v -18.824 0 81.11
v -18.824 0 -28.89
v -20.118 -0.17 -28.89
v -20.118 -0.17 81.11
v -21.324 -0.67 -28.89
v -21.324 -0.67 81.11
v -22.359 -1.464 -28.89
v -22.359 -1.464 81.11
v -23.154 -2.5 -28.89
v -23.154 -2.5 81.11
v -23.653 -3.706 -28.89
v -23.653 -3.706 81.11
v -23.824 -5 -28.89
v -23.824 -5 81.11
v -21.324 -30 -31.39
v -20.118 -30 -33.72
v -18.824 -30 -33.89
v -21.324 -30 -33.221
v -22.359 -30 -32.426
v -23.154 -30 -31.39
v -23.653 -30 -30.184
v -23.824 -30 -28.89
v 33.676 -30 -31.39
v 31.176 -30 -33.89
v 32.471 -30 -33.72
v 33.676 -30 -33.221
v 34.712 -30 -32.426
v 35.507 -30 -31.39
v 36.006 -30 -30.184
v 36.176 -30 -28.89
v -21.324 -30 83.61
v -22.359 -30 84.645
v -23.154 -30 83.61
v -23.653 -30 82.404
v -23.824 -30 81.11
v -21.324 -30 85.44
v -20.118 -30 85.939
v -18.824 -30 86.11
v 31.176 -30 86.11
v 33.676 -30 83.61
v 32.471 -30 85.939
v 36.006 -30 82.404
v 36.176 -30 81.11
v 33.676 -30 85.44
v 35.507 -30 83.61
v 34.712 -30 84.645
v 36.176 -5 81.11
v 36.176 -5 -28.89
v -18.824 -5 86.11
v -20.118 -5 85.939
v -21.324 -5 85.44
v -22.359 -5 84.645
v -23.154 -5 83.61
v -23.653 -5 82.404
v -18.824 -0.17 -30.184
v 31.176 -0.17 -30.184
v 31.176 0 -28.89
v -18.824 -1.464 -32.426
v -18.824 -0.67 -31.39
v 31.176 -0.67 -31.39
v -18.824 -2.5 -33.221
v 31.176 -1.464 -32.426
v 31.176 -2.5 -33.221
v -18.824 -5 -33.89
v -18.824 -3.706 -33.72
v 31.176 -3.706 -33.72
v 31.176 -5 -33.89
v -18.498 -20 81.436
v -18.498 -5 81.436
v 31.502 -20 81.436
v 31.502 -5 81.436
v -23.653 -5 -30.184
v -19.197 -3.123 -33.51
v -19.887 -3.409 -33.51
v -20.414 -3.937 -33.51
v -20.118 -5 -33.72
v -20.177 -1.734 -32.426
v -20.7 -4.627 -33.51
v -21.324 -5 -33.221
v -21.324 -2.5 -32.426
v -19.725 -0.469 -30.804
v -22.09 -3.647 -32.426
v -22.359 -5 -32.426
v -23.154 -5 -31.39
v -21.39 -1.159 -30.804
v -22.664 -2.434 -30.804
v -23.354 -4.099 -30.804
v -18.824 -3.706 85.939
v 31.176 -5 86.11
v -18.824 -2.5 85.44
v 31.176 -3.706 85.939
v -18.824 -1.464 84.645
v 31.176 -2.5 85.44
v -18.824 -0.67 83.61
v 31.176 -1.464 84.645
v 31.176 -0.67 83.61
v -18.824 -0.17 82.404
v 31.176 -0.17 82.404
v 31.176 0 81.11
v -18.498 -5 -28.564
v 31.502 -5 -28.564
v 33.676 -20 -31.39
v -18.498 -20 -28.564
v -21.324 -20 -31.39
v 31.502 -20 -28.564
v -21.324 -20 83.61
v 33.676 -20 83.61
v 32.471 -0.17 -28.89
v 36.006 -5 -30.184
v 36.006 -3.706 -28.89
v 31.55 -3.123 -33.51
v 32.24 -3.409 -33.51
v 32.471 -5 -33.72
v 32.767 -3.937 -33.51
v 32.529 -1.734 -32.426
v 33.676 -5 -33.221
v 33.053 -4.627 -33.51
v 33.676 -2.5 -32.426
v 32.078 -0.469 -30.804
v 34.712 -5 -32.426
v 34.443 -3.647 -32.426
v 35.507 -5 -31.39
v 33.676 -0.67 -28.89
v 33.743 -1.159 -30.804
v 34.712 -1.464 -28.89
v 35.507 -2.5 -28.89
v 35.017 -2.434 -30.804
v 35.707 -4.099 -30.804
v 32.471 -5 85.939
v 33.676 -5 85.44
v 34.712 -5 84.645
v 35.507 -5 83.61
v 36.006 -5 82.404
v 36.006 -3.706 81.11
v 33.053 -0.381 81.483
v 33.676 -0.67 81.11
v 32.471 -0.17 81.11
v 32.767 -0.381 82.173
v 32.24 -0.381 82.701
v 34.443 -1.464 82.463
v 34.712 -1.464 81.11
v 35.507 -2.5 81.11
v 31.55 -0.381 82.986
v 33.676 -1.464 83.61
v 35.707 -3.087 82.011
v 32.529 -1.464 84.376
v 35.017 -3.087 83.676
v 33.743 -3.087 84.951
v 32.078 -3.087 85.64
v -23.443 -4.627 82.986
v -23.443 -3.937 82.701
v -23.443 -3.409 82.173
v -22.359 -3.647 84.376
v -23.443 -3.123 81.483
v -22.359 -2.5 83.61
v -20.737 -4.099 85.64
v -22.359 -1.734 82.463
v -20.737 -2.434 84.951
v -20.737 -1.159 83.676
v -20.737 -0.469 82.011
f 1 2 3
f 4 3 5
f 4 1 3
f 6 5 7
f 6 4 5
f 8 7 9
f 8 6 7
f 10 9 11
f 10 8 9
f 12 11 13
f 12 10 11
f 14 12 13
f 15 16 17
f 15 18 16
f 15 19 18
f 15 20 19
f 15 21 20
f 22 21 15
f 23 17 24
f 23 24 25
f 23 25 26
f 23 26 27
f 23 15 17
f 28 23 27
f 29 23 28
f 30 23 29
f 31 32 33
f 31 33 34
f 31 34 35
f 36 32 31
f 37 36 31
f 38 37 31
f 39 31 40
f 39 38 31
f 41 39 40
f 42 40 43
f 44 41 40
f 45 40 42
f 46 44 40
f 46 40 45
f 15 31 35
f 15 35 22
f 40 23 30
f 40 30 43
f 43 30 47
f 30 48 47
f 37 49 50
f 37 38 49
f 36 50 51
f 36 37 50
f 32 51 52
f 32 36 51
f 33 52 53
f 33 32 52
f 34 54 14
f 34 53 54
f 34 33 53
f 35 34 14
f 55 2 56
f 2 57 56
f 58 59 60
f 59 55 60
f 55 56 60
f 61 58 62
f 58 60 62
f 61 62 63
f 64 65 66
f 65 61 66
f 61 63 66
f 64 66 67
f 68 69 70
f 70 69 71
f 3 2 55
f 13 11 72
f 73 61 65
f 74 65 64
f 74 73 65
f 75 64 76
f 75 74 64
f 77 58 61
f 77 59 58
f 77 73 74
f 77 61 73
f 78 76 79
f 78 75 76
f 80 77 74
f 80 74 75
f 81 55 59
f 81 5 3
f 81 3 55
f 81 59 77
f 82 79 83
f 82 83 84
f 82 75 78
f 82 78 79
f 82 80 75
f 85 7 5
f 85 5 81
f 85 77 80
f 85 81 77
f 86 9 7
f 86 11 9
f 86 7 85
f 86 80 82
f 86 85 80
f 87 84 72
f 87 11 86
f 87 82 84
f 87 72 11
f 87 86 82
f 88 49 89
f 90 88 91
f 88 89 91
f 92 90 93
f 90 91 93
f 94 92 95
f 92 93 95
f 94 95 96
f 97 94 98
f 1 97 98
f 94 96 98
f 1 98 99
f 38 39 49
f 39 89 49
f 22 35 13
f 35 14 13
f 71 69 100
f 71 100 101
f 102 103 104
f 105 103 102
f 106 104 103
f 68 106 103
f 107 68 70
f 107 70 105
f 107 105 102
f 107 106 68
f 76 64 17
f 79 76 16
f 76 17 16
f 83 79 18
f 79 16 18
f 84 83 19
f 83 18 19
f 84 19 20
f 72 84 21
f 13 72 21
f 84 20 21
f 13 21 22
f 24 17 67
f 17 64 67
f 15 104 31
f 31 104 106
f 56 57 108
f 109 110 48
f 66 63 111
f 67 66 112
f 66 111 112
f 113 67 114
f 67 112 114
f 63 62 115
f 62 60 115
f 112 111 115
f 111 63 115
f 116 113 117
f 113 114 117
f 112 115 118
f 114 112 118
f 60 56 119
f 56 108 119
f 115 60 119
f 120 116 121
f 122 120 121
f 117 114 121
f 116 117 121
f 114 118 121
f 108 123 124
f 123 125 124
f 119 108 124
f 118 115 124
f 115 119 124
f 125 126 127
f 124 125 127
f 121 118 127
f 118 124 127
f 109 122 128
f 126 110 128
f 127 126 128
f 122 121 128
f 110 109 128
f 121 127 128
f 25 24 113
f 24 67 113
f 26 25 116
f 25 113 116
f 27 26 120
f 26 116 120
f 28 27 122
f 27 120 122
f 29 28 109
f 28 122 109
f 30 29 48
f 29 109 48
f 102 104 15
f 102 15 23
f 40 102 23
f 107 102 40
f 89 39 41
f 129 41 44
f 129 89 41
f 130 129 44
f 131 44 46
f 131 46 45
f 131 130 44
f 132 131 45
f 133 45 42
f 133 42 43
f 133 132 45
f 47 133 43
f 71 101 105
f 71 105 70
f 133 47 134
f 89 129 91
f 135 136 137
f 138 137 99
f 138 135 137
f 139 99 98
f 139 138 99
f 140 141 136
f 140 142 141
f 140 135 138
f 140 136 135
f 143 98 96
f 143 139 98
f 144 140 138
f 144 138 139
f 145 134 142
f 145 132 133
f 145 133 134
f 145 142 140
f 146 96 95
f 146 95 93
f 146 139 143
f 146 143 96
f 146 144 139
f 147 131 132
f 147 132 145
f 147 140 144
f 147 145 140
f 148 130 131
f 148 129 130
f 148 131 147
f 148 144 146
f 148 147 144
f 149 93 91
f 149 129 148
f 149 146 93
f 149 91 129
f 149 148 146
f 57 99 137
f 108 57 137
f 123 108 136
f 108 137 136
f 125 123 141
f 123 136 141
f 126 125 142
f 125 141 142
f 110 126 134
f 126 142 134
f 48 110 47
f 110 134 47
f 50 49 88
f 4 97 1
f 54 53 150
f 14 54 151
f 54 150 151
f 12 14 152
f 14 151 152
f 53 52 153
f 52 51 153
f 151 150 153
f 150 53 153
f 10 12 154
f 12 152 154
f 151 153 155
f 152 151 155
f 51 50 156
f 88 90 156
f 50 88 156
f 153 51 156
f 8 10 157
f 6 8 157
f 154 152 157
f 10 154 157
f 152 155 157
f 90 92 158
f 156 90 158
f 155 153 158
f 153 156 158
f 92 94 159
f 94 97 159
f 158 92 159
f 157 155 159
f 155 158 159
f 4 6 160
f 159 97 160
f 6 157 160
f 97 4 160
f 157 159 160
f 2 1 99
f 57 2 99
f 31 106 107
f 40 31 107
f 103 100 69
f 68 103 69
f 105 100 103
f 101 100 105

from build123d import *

# Parameters (mm, degrees)
F1_W     = 60
F1_H     = 120
F1_W_2   = 55
F1_H_2   = 115
F1_W_3   = 50
F1_H_3   = 110
F2_DEPTH = 20
F3_W     = 55
F3_H     = 115
F5_DEPTH = 10
F0_W     = 60
F0_H     = 120
F6_DEPTH = 5
F7_R     = 5


with BuildPart() as f2:
    # F1 (on face) → F2 (new body)
    with BuildSketch(Plane.XZ):
        with Locations((6.1764717102, 26.1096255195)):
            Rectangle(F1_W, F1_H)
        with Locations((6.14081949, 26.4180475473)):
            Rectangle(F1_W_2, F1_H_2, mode=Mode.SUBTRACT)
        with Locations((6.14081949, 26.4180475473)):
            Rectangle(F1_W_2, F1_H_2)
        with Locations((6.5019752085, 26.4363238215)):
            Rectangle(F1_W_3, F1_H_3, mode=Mode.SUBTRACT)
    extrude(amount=F2_DEPTH)

    # F3 (on face) → F5 (join)
    with BuildSketch(Plane.XZ.offset(20)):
        Polygon((36.1764717102, 86.1096255195), (-23.8235282898, 86.1096255195), (-23.8235282898, 83.6096255195), (-23.8235282898, -33.8903744805), (36.1764717102, -33.8903744805), align=None)
        with Locations((6.1764717102, 26.1096255195)):
            Rectangle(F3_W, F3_H, mode=Mode.SUBTRACT)
    extrude(amount=F5_DEPTH)

    # F0 (on Front) → F6 (join)
    with BuildSketch(Plane.XZ):
        with Locations((6.1764717102, 26.1096255195)):
            Rectangle(F0_W, F0_H)
    extrude(amount=F6_DEPTH)

    # F7
    f7_edges = [f2.edges().sort_by_distance(p)[0] for p in [
        (36.176472, -15, 86.109626),
        (36.176472, 0, 26.109626),
        (6.176472, 0, 86.109626),
        (-23.823528, -15, 86.109626),
        (-23.823528, 0, 26.109626),
        (6.176472, 0, -33.890374),
        (36.176472, -15, -33.890374),
        (-23.823528, -15, -33.890374),
    ]]
    fillet(f7_edges, radius=F7_R)


solid = f2.part
